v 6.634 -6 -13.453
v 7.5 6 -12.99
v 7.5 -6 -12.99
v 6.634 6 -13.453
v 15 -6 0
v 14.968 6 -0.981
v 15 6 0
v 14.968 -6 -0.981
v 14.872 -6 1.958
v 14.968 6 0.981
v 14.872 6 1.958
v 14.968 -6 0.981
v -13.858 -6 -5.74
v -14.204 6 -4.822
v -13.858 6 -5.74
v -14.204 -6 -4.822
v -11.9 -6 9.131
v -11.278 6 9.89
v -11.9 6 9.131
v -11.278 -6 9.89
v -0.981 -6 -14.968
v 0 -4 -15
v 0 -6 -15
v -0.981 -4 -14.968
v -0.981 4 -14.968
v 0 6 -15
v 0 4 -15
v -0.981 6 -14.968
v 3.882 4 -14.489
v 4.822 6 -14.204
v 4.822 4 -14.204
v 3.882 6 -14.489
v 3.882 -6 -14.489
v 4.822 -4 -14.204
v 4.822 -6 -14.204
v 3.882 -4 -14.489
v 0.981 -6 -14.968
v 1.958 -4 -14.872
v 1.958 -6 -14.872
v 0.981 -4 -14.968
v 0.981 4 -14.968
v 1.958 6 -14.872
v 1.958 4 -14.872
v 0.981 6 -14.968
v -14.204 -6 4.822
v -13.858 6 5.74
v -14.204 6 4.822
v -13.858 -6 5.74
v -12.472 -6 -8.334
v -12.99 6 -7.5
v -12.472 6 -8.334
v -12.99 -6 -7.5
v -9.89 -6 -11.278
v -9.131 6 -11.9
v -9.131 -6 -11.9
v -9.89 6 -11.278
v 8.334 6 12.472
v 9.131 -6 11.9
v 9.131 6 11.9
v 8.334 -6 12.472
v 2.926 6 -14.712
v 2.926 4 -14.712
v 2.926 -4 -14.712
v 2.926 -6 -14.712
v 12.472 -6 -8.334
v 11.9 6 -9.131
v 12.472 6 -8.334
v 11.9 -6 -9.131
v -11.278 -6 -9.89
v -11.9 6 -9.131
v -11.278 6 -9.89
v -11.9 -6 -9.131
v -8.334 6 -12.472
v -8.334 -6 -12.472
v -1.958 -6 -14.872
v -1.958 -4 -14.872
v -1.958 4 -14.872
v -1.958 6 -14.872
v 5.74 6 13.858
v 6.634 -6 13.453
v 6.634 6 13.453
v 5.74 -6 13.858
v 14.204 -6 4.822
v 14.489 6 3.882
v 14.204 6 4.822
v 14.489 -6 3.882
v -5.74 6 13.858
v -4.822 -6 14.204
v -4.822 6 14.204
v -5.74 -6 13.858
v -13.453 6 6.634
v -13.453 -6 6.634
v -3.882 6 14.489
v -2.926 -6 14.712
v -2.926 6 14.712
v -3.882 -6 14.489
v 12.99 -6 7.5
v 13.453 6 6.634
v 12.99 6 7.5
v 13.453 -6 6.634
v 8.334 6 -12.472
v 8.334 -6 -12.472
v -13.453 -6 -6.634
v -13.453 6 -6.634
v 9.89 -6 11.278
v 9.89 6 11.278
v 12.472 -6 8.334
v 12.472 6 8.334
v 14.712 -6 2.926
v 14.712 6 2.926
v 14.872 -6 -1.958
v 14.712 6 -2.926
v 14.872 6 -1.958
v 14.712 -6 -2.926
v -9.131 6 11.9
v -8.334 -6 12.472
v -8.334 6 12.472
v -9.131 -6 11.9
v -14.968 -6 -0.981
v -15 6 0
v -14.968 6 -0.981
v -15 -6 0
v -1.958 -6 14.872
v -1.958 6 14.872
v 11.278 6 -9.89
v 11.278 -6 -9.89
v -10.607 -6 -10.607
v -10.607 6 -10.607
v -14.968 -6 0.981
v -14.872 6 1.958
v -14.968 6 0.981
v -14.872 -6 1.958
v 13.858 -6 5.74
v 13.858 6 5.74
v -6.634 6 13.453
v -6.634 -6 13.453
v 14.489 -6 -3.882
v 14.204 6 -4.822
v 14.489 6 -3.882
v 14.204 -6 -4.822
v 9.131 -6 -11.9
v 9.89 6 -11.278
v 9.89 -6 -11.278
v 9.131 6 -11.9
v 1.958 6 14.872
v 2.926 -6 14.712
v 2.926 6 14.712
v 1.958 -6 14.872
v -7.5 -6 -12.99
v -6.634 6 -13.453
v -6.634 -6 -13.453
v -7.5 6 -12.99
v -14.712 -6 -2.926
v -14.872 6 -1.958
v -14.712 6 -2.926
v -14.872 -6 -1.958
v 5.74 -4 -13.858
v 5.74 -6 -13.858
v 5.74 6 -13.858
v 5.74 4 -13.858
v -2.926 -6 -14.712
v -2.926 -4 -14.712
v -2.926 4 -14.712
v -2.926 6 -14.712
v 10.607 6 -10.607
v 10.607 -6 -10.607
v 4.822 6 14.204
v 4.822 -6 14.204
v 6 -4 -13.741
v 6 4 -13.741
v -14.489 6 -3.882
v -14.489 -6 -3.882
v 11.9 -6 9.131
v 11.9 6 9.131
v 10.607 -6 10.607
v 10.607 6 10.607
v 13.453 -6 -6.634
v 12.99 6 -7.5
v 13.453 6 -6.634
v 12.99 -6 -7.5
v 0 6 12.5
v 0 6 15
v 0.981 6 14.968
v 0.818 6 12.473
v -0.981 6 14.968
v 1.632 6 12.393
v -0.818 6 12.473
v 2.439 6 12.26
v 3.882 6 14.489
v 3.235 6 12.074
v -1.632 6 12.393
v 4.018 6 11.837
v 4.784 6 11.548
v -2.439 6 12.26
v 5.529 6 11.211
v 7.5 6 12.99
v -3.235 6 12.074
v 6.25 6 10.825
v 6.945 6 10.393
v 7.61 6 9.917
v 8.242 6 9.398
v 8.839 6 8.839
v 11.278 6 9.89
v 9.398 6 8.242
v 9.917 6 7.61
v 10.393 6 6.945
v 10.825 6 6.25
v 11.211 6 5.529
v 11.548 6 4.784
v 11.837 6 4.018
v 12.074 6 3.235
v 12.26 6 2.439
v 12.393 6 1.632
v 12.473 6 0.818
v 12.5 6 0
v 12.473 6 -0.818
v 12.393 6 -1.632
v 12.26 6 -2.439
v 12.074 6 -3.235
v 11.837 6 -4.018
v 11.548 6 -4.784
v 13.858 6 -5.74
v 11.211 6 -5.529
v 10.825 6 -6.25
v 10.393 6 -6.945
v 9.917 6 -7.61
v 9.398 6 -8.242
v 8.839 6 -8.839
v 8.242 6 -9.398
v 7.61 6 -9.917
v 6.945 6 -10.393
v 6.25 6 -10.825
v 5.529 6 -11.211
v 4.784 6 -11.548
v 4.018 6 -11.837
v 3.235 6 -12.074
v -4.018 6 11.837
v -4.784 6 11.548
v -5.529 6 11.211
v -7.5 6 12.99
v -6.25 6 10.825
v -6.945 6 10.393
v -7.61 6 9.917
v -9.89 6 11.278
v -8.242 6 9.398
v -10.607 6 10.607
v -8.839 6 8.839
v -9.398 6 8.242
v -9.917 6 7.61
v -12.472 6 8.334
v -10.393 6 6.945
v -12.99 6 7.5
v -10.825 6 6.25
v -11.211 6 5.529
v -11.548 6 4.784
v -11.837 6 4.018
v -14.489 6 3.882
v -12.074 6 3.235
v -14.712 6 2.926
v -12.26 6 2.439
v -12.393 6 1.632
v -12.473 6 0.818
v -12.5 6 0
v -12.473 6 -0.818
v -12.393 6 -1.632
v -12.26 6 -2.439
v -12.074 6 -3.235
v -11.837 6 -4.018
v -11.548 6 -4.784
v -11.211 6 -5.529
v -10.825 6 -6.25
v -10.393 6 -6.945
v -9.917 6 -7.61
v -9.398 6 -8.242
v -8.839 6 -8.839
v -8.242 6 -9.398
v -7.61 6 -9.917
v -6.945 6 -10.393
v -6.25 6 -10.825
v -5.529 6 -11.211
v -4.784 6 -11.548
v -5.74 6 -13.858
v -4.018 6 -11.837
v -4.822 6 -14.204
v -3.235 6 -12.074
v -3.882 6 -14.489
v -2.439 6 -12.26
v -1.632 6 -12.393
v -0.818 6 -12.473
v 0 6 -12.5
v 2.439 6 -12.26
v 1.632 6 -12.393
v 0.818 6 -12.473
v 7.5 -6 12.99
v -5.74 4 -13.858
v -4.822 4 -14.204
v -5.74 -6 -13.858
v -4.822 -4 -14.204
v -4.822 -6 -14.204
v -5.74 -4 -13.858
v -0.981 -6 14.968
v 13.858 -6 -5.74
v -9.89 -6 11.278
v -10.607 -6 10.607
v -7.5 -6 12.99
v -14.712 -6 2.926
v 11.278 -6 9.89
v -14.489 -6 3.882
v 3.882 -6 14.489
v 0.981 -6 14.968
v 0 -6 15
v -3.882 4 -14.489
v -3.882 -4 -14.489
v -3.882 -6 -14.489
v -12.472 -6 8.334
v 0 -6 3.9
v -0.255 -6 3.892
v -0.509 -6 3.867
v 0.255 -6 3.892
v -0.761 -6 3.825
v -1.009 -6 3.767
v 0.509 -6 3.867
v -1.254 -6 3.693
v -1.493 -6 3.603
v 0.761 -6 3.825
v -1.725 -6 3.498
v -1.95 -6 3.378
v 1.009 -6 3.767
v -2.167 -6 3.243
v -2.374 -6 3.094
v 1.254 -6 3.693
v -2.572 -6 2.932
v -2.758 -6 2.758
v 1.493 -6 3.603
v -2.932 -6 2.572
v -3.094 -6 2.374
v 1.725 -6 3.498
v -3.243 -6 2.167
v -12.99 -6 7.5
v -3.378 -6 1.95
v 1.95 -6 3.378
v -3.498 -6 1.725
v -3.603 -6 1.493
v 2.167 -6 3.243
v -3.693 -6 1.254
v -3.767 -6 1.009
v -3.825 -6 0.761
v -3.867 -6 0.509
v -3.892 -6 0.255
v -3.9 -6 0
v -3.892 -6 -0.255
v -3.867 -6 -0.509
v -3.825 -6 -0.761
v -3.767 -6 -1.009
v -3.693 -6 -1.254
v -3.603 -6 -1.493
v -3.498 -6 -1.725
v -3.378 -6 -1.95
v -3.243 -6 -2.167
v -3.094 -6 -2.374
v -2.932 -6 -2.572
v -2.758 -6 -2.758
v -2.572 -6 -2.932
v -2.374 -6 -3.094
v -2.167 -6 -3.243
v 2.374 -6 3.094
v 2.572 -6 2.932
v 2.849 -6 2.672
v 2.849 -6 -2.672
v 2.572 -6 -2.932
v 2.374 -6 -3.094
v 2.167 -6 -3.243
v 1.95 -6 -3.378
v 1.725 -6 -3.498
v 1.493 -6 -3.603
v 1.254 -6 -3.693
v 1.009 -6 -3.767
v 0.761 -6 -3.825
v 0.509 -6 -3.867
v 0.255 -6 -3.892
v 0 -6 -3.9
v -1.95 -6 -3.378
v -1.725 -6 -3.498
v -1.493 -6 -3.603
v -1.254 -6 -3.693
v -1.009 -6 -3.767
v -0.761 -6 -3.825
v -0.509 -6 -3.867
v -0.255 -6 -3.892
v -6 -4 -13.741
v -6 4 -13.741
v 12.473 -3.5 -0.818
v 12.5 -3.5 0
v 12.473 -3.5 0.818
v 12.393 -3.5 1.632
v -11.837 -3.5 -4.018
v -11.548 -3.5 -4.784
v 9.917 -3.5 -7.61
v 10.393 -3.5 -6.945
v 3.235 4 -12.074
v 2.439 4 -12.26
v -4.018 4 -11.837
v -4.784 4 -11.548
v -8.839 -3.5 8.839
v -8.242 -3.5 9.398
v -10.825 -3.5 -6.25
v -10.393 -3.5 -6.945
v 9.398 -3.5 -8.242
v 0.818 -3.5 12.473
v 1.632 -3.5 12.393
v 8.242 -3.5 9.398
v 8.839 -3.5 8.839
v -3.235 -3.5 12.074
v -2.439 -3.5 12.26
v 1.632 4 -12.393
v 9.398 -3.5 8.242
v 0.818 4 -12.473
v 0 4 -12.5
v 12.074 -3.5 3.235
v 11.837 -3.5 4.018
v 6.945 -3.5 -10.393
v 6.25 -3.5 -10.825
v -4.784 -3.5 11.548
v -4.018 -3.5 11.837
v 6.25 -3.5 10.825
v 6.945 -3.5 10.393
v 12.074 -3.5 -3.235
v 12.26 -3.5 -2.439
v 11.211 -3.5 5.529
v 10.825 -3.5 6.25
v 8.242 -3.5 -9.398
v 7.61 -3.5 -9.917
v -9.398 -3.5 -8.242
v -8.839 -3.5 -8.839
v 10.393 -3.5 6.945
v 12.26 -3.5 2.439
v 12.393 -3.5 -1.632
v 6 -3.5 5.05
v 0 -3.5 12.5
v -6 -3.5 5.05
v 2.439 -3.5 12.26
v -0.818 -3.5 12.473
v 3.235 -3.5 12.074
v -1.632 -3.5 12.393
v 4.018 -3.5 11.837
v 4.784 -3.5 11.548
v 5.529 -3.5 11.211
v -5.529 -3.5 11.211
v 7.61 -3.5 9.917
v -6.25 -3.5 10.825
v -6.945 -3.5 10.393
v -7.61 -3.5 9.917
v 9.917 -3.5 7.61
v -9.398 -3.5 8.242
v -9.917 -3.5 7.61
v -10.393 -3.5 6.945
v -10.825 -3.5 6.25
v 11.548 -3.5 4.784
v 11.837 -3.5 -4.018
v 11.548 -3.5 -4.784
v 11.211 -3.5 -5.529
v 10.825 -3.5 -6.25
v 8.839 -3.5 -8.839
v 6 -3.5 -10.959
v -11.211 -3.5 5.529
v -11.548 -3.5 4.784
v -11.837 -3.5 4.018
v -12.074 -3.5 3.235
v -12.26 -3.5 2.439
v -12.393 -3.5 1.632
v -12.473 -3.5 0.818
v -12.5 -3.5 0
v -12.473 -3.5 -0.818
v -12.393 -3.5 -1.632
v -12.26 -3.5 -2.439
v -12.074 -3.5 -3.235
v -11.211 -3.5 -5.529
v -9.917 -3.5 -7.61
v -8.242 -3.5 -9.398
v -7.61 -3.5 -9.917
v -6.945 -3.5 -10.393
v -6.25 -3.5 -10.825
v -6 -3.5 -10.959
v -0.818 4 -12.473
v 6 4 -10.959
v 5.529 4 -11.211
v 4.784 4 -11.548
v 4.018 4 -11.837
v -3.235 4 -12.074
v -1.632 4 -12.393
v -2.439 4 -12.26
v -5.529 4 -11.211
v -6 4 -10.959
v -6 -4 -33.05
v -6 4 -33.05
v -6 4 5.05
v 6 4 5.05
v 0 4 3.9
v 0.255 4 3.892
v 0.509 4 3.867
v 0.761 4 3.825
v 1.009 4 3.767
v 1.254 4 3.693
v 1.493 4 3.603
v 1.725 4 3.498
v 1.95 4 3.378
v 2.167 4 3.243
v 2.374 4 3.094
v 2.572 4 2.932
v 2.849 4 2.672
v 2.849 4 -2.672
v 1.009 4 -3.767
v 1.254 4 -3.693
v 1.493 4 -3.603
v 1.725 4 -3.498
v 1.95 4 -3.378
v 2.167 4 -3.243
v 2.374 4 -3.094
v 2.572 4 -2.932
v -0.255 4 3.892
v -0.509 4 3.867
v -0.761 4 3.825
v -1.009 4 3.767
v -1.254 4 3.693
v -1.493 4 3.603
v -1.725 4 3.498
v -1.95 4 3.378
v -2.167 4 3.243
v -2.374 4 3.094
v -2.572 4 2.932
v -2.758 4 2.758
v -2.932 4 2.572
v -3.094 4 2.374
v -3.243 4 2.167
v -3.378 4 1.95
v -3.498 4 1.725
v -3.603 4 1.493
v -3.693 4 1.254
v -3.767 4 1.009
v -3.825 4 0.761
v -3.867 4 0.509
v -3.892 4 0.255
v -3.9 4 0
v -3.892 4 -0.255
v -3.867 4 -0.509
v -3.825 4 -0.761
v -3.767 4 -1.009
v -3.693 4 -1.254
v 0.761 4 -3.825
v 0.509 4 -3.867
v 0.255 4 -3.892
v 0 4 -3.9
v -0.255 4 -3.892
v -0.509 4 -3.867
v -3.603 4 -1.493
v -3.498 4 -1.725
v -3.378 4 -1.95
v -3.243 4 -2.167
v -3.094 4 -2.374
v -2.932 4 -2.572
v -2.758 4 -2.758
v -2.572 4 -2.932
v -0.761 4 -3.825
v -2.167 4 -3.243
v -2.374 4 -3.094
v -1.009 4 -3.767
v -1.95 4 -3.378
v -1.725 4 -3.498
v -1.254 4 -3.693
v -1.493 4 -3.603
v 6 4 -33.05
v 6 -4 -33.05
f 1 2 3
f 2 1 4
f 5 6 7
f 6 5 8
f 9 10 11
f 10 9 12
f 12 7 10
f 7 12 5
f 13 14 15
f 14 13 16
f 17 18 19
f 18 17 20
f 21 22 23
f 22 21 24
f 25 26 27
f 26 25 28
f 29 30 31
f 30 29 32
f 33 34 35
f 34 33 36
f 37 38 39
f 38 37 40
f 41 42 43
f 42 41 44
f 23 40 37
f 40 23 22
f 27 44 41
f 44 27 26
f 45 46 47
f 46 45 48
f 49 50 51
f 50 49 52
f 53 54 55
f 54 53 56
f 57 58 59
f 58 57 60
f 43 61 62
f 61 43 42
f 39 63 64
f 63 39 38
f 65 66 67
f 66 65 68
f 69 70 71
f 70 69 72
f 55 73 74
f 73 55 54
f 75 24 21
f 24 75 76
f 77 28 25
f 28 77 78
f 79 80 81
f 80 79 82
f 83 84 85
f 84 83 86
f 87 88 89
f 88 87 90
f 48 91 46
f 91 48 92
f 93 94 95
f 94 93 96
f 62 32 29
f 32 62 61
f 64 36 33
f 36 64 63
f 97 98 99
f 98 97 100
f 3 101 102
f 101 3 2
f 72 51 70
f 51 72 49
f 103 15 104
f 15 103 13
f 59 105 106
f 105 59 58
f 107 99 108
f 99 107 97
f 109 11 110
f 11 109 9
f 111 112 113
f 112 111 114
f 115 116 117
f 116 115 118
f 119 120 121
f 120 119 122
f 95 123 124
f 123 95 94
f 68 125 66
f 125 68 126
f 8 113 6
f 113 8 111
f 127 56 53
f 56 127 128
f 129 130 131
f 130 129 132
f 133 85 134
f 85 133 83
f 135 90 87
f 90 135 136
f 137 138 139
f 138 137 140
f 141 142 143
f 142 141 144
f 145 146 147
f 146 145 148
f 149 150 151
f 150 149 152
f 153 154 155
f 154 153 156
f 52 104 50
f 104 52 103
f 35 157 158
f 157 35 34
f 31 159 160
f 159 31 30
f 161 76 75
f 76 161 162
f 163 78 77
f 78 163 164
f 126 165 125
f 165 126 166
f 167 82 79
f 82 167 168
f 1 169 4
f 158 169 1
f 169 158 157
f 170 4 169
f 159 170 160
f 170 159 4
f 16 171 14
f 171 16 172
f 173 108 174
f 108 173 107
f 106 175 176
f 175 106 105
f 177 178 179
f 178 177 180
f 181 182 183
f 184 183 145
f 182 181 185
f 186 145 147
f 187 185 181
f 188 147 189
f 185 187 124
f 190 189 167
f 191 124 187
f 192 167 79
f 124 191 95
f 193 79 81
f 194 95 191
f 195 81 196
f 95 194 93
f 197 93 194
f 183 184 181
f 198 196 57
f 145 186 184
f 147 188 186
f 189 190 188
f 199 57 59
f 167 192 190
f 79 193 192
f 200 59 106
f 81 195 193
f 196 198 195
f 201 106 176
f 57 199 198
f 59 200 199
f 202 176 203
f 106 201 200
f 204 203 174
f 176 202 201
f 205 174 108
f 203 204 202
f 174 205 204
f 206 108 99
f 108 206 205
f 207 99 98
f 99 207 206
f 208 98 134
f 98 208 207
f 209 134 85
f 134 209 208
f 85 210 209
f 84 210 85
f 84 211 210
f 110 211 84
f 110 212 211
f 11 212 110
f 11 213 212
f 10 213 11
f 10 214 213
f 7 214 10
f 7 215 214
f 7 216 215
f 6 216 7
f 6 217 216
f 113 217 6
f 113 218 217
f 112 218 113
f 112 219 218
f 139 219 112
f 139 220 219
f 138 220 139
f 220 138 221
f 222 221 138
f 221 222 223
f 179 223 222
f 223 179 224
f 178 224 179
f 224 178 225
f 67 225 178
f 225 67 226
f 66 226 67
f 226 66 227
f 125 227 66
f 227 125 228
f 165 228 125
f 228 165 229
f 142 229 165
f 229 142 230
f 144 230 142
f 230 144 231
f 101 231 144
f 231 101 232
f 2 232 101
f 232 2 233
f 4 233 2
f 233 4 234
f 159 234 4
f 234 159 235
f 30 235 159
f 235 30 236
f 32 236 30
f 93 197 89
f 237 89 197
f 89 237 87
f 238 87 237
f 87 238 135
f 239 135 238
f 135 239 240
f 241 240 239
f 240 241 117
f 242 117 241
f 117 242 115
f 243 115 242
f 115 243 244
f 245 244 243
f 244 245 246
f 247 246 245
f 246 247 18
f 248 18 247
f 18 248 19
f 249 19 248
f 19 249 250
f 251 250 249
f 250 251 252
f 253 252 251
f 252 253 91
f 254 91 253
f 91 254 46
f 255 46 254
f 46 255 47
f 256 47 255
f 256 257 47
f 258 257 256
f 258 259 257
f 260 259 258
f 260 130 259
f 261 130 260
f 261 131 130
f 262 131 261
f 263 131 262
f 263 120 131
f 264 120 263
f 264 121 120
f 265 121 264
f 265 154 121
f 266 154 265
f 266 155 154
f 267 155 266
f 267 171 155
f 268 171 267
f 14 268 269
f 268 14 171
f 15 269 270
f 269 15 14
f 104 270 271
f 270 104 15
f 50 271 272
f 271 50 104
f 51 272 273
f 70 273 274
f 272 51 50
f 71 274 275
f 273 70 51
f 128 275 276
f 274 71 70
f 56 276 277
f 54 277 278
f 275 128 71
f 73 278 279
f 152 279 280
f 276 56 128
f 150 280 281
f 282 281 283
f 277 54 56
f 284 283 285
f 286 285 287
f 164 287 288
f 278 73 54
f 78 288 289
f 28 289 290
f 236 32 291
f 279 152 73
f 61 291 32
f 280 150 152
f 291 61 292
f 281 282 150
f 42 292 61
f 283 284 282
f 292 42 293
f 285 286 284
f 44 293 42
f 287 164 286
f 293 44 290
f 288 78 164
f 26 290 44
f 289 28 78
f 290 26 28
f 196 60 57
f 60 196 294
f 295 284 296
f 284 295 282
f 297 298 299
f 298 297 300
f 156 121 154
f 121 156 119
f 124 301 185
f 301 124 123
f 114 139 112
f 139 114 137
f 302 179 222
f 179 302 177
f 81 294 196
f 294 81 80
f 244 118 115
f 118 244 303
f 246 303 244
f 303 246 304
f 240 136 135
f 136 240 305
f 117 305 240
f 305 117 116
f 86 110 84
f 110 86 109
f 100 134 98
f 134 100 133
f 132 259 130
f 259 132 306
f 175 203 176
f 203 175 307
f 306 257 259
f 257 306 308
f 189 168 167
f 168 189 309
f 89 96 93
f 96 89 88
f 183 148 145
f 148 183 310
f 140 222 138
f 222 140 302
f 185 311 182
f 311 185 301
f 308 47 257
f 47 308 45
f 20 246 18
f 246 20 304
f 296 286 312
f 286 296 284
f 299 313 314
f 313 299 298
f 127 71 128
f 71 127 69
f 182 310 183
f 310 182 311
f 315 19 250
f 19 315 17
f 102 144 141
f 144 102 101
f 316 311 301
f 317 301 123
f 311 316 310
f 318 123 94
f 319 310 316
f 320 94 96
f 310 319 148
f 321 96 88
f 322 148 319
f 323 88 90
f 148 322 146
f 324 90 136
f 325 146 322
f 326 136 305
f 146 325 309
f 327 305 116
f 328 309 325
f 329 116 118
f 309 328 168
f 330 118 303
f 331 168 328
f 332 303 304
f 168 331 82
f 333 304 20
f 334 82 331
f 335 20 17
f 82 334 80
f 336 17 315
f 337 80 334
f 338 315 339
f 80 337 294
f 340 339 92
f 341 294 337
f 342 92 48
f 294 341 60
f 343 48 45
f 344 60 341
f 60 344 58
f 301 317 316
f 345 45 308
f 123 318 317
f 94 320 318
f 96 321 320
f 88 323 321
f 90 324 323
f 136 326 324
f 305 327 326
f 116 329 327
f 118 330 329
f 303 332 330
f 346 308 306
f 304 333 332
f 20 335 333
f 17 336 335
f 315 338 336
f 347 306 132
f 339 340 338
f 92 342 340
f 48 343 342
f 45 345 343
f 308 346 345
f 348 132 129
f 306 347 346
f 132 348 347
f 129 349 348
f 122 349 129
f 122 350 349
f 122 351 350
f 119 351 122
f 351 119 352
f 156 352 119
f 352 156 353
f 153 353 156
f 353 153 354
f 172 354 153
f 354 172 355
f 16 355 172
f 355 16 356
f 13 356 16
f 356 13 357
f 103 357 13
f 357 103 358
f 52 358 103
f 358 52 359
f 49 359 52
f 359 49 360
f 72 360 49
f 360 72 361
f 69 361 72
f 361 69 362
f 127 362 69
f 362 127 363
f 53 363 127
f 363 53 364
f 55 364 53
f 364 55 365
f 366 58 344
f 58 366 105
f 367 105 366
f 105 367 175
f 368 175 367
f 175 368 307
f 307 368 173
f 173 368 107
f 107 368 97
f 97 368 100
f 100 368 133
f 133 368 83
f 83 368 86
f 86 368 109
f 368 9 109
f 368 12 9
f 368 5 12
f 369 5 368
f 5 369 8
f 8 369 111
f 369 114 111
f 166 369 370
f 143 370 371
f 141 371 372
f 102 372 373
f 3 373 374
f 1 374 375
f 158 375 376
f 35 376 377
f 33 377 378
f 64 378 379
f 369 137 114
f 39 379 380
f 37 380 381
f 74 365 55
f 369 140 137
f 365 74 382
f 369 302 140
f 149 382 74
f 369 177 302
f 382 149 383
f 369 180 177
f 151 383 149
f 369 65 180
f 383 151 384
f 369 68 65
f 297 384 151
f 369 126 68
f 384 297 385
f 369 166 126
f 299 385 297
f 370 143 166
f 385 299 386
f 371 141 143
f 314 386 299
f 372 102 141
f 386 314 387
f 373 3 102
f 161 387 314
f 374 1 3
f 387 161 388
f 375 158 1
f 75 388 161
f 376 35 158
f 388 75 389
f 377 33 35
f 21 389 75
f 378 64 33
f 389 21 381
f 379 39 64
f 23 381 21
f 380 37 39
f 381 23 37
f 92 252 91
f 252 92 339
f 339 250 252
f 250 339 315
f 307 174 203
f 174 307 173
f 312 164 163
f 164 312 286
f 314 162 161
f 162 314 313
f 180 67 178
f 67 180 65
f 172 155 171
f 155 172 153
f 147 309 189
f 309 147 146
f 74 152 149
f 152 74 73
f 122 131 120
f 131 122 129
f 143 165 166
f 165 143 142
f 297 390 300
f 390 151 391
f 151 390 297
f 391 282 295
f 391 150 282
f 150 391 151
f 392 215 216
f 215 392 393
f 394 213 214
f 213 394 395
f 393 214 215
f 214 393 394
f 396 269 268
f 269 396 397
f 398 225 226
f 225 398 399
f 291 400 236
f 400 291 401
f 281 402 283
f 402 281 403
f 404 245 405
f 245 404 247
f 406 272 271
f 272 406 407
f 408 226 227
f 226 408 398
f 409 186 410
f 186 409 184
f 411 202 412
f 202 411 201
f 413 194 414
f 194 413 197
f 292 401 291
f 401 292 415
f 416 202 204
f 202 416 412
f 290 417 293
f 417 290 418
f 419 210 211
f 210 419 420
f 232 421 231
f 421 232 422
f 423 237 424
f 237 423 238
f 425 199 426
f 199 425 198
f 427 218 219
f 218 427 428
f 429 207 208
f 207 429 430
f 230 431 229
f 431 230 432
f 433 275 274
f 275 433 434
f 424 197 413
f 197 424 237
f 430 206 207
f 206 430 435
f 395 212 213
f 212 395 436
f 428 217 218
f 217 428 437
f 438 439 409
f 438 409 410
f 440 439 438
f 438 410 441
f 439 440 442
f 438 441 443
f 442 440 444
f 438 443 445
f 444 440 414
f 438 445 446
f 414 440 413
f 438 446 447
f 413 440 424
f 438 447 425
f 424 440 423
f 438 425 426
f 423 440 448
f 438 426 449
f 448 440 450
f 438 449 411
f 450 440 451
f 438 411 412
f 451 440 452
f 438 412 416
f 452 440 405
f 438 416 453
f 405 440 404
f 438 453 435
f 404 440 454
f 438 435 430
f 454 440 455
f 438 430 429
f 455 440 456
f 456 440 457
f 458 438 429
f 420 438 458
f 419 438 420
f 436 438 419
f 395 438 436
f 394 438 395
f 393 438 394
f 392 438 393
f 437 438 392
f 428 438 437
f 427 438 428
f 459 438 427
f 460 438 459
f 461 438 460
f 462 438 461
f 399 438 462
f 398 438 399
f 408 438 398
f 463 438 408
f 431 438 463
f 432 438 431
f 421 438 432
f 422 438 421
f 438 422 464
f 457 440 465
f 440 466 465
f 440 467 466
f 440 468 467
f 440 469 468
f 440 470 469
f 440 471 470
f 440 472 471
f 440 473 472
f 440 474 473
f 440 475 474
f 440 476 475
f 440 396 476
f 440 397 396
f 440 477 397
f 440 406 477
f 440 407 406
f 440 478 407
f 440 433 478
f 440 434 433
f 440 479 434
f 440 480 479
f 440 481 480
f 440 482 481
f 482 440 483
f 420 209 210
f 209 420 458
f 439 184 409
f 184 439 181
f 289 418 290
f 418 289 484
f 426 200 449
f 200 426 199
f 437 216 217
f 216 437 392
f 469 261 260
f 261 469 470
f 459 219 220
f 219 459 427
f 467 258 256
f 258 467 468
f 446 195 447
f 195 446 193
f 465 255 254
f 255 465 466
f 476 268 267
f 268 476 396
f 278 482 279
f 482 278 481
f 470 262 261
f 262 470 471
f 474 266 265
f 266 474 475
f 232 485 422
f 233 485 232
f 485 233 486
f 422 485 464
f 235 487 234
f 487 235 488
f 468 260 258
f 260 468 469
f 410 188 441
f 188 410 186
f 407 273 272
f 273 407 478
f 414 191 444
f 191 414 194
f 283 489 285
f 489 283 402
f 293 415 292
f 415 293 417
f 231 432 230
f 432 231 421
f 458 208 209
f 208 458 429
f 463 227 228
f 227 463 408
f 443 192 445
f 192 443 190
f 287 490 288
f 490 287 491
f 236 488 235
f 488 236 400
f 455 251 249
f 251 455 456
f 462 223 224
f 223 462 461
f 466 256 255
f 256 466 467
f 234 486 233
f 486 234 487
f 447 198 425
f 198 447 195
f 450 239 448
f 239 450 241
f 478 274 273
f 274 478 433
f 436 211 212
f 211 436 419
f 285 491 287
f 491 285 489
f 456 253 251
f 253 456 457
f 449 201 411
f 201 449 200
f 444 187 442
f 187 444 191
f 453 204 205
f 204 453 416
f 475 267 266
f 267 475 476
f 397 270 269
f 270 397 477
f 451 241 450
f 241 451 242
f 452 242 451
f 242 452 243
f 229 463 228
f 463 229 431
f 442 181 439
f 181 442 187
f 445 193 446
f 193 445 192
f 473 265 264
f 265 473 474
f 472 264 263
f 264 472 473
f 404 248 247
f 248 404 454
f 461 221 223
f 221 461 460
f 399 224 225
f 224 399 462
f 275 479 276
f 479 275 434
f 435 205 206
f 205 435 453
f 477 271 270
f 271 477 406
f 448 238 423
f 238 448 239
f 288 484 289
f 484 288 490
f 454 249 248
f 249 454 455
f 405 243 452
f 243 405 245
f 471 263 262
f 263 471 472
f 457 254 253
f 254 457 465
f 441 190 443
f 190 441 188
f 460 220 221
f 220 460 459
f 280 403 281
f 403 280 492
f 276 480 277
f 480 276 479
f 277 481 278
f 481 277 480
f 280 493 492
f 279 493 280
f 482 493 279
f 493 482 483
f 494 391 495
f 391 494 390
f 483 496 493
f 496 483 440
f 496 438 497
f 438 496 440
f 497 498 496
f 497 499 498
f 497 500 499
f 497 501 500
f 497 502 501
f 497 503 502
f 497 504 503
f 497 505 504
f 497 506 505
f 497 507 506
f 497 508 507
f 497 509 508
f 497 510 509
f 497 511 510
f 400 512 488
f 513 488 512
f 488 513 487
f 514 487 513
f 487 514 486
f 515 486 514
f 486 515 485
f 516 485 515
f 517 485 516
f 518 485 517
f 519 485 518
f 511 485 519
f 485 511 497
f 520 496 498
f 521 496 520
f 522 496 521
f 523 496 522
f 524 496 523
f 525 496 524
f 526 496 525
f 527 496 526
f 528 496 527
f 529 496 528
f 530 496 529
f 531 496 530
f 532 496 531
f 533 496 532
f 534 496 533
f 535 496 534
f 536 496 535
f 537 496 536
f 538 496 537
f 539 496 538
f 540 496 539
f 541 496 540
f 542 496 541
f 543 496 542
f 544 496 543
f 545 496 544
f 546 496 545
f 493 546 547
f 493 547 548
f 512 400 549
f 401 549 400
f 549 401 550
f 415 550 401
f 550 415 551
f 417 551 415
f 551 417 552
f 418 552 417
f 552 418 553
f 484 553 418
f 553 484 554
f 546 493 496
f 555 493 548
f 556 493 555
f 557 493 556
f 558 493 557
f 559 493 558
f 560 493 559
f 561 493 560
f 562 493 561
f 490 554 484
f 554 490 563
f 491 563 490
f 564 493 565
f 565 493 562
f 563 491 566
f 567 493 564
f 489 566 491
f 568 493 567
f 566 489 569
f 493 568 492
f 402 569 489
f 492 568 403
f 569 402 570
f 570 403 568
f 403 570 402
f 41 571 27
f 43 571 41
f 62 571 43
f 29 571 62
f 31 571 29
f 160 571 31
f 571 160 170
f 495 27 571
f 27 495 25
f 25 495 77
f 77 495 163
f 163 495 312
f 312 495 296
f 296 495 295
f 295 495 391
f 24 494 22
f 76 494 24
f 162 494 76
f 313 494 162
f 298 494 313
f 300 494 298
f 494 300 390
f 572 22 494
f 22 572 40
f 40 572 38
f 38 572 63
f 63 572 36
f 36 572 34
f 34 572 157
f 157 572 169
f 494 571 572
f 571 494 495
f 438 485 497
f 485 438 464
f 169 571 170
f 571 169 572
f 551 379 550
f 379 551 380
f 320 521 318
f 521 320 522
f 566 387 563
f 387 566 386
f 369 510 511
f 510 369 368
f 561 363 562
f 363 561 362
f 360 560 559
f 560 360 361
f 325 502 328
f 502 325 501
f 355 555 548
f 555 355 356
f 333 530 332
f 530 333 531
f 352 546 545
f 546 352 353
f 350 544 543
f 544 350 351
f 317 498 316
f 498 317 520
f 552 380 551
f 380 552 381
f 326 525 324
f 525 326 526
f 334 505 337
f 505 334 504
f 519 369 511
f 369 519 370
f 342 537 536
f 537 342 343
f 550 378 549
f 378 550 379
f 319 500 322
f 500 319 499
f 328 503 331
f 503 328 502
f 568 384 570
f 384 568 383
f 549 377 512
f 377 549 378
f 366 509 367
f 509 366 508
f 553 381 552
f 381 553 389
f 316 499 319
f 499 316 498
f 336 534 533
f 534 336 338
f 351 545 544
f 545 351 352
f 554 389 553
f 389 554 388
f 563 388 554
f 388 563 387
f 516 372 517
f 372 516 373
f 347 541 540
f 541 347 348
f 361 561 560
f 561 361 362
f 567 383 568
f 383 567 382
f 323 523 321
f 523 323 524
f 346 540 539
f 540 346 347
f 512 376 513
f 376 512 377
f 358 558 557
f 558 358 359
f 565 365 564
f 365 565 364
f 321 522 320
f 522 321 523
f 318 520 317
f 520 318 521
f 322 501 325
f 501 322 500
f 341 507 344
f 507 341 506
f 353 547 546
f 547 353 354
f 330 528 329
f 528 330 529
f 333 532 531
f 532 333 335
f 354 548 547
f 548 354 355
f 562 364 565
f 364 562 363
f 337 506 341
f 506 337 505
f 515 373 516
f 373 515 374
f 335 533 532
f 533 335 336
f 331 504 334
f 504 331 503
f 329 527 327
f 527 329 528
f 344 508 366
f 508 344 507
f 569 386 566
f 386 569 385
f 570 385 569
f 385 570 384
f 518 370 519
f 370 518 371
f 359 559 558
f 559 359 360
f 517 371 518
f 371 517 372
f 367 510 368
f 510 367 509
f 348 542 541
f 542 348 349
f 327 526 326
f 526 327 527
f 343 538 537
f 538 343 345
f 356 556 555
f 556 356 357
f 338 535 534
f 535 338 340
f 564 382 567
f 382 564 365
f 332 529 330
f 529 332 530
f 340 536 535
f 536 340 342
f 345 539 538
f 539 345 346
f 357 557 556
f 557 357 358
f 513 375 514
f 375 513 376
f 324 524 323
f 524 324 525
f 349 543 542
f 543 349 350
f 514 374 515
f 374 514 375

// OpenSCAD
// Removable tap lever: the piece shown on the LEFT in original.png.
// Units: millimeters. Z is up; +Y faces the user when installed.

$fn = 96;

// Measured from the user's description.
fit_hole_diameter = 7;
fit_flat_length = 5;
fit_flat_offset = sqrt(pow(fit_hole_diameter / 2, 2) - pow(fit_flat_length / 2, 2));
fit_flat_angle = 90; // degrees: 0 = top; positive rotates toward +X when viewed from the front
fit_clearance = 0.4; // per side; adjust to suit the printer/material
fit_demo_mode = false; // true prints only the small fit coupon
fit_demo_side = 12;
fit_demo_thickness = 3;

// Approximate outer dimensions from the photo; refine after measuring the part.
cup_diameter = 30;
cup_depth = 12;
cup_wall = 2.5;
drive_cut_extension = 5; // length beyond the round hole
lever_length = 50;
lever_width = 12;
lever_thickness = 8;

module d_profile_2d() {
    // Nominal 7 mm round profile with a 5 mm straight flat edge.
    rotate(-fit_flat_angle) {
        intersection() {
            circle(d = fit_hole_diameter);
            translate([-fit_hole_diameter / 2, -fit_hole_diameter / 2])
                square([fit_hole_diameter,
                        fit_flat_offset + fit_hole_diameter / 2]);
        }
    }
}

module d_profile_hole() {
    // Offset the full D outline for print-in clearance, preserving its shape.
    rotate([90, 0, 0])
        linear_extrude(height = cup_depth + 0.2, center = true)
            offset(delta = fit_clearance)
                d_profile_2d();
}

module fit_demo_coupon() {
    // A small square coupon with the same D-profile, printed hole-axis-up for speed.
    difference() {
        cube([fit_demo_side, fit_demo_side, fit_demo_thickness], center = true);

        translate([0, 0, -0.1])
            linear_extrude(height = fit_demo_thickness + 0.2)
                offset(delta = fit_clearance)
                    d_profile_2d();
    }
}

module removable_tap_lever() {
    difference() {
        union() {
            // Cup-shaped round head; recess opens toward the user (+Y).
            difference() {
                rotate([90, 0, 0])
                    cylinder(h = cup_depth, d = cup_diameter, center = true);

                translate([0, cup_wall / 2 + 0.05, 0])
                    rotate([90, 0, 0])
                        cylinder(h = cup_depth - cup_wall + 0.1,
                                 d = cup_diameter - 2 * cup_wall,
                                 center = true);
            }

            // Handle hangs below the round head, as in the photo.
            translate([0, 0, -cup_diameter / 2 + 1])
                hull() {
                    translate([0, 0, lever_length / 2 - lever_width / 2])
                        cube([lever_width, lever_thickness, 0.1], center = true);
                    translate([0, 0, -lever_length / 2 + lever_width / 2])
                        cube([lever_width, lever_thickness, 0.1], center = true);
                }
        }

        d_profile_hole();
    }
}

if (fit_demo_mode)
    fit_demo_coupon();
else
    removable_tap_lever();
